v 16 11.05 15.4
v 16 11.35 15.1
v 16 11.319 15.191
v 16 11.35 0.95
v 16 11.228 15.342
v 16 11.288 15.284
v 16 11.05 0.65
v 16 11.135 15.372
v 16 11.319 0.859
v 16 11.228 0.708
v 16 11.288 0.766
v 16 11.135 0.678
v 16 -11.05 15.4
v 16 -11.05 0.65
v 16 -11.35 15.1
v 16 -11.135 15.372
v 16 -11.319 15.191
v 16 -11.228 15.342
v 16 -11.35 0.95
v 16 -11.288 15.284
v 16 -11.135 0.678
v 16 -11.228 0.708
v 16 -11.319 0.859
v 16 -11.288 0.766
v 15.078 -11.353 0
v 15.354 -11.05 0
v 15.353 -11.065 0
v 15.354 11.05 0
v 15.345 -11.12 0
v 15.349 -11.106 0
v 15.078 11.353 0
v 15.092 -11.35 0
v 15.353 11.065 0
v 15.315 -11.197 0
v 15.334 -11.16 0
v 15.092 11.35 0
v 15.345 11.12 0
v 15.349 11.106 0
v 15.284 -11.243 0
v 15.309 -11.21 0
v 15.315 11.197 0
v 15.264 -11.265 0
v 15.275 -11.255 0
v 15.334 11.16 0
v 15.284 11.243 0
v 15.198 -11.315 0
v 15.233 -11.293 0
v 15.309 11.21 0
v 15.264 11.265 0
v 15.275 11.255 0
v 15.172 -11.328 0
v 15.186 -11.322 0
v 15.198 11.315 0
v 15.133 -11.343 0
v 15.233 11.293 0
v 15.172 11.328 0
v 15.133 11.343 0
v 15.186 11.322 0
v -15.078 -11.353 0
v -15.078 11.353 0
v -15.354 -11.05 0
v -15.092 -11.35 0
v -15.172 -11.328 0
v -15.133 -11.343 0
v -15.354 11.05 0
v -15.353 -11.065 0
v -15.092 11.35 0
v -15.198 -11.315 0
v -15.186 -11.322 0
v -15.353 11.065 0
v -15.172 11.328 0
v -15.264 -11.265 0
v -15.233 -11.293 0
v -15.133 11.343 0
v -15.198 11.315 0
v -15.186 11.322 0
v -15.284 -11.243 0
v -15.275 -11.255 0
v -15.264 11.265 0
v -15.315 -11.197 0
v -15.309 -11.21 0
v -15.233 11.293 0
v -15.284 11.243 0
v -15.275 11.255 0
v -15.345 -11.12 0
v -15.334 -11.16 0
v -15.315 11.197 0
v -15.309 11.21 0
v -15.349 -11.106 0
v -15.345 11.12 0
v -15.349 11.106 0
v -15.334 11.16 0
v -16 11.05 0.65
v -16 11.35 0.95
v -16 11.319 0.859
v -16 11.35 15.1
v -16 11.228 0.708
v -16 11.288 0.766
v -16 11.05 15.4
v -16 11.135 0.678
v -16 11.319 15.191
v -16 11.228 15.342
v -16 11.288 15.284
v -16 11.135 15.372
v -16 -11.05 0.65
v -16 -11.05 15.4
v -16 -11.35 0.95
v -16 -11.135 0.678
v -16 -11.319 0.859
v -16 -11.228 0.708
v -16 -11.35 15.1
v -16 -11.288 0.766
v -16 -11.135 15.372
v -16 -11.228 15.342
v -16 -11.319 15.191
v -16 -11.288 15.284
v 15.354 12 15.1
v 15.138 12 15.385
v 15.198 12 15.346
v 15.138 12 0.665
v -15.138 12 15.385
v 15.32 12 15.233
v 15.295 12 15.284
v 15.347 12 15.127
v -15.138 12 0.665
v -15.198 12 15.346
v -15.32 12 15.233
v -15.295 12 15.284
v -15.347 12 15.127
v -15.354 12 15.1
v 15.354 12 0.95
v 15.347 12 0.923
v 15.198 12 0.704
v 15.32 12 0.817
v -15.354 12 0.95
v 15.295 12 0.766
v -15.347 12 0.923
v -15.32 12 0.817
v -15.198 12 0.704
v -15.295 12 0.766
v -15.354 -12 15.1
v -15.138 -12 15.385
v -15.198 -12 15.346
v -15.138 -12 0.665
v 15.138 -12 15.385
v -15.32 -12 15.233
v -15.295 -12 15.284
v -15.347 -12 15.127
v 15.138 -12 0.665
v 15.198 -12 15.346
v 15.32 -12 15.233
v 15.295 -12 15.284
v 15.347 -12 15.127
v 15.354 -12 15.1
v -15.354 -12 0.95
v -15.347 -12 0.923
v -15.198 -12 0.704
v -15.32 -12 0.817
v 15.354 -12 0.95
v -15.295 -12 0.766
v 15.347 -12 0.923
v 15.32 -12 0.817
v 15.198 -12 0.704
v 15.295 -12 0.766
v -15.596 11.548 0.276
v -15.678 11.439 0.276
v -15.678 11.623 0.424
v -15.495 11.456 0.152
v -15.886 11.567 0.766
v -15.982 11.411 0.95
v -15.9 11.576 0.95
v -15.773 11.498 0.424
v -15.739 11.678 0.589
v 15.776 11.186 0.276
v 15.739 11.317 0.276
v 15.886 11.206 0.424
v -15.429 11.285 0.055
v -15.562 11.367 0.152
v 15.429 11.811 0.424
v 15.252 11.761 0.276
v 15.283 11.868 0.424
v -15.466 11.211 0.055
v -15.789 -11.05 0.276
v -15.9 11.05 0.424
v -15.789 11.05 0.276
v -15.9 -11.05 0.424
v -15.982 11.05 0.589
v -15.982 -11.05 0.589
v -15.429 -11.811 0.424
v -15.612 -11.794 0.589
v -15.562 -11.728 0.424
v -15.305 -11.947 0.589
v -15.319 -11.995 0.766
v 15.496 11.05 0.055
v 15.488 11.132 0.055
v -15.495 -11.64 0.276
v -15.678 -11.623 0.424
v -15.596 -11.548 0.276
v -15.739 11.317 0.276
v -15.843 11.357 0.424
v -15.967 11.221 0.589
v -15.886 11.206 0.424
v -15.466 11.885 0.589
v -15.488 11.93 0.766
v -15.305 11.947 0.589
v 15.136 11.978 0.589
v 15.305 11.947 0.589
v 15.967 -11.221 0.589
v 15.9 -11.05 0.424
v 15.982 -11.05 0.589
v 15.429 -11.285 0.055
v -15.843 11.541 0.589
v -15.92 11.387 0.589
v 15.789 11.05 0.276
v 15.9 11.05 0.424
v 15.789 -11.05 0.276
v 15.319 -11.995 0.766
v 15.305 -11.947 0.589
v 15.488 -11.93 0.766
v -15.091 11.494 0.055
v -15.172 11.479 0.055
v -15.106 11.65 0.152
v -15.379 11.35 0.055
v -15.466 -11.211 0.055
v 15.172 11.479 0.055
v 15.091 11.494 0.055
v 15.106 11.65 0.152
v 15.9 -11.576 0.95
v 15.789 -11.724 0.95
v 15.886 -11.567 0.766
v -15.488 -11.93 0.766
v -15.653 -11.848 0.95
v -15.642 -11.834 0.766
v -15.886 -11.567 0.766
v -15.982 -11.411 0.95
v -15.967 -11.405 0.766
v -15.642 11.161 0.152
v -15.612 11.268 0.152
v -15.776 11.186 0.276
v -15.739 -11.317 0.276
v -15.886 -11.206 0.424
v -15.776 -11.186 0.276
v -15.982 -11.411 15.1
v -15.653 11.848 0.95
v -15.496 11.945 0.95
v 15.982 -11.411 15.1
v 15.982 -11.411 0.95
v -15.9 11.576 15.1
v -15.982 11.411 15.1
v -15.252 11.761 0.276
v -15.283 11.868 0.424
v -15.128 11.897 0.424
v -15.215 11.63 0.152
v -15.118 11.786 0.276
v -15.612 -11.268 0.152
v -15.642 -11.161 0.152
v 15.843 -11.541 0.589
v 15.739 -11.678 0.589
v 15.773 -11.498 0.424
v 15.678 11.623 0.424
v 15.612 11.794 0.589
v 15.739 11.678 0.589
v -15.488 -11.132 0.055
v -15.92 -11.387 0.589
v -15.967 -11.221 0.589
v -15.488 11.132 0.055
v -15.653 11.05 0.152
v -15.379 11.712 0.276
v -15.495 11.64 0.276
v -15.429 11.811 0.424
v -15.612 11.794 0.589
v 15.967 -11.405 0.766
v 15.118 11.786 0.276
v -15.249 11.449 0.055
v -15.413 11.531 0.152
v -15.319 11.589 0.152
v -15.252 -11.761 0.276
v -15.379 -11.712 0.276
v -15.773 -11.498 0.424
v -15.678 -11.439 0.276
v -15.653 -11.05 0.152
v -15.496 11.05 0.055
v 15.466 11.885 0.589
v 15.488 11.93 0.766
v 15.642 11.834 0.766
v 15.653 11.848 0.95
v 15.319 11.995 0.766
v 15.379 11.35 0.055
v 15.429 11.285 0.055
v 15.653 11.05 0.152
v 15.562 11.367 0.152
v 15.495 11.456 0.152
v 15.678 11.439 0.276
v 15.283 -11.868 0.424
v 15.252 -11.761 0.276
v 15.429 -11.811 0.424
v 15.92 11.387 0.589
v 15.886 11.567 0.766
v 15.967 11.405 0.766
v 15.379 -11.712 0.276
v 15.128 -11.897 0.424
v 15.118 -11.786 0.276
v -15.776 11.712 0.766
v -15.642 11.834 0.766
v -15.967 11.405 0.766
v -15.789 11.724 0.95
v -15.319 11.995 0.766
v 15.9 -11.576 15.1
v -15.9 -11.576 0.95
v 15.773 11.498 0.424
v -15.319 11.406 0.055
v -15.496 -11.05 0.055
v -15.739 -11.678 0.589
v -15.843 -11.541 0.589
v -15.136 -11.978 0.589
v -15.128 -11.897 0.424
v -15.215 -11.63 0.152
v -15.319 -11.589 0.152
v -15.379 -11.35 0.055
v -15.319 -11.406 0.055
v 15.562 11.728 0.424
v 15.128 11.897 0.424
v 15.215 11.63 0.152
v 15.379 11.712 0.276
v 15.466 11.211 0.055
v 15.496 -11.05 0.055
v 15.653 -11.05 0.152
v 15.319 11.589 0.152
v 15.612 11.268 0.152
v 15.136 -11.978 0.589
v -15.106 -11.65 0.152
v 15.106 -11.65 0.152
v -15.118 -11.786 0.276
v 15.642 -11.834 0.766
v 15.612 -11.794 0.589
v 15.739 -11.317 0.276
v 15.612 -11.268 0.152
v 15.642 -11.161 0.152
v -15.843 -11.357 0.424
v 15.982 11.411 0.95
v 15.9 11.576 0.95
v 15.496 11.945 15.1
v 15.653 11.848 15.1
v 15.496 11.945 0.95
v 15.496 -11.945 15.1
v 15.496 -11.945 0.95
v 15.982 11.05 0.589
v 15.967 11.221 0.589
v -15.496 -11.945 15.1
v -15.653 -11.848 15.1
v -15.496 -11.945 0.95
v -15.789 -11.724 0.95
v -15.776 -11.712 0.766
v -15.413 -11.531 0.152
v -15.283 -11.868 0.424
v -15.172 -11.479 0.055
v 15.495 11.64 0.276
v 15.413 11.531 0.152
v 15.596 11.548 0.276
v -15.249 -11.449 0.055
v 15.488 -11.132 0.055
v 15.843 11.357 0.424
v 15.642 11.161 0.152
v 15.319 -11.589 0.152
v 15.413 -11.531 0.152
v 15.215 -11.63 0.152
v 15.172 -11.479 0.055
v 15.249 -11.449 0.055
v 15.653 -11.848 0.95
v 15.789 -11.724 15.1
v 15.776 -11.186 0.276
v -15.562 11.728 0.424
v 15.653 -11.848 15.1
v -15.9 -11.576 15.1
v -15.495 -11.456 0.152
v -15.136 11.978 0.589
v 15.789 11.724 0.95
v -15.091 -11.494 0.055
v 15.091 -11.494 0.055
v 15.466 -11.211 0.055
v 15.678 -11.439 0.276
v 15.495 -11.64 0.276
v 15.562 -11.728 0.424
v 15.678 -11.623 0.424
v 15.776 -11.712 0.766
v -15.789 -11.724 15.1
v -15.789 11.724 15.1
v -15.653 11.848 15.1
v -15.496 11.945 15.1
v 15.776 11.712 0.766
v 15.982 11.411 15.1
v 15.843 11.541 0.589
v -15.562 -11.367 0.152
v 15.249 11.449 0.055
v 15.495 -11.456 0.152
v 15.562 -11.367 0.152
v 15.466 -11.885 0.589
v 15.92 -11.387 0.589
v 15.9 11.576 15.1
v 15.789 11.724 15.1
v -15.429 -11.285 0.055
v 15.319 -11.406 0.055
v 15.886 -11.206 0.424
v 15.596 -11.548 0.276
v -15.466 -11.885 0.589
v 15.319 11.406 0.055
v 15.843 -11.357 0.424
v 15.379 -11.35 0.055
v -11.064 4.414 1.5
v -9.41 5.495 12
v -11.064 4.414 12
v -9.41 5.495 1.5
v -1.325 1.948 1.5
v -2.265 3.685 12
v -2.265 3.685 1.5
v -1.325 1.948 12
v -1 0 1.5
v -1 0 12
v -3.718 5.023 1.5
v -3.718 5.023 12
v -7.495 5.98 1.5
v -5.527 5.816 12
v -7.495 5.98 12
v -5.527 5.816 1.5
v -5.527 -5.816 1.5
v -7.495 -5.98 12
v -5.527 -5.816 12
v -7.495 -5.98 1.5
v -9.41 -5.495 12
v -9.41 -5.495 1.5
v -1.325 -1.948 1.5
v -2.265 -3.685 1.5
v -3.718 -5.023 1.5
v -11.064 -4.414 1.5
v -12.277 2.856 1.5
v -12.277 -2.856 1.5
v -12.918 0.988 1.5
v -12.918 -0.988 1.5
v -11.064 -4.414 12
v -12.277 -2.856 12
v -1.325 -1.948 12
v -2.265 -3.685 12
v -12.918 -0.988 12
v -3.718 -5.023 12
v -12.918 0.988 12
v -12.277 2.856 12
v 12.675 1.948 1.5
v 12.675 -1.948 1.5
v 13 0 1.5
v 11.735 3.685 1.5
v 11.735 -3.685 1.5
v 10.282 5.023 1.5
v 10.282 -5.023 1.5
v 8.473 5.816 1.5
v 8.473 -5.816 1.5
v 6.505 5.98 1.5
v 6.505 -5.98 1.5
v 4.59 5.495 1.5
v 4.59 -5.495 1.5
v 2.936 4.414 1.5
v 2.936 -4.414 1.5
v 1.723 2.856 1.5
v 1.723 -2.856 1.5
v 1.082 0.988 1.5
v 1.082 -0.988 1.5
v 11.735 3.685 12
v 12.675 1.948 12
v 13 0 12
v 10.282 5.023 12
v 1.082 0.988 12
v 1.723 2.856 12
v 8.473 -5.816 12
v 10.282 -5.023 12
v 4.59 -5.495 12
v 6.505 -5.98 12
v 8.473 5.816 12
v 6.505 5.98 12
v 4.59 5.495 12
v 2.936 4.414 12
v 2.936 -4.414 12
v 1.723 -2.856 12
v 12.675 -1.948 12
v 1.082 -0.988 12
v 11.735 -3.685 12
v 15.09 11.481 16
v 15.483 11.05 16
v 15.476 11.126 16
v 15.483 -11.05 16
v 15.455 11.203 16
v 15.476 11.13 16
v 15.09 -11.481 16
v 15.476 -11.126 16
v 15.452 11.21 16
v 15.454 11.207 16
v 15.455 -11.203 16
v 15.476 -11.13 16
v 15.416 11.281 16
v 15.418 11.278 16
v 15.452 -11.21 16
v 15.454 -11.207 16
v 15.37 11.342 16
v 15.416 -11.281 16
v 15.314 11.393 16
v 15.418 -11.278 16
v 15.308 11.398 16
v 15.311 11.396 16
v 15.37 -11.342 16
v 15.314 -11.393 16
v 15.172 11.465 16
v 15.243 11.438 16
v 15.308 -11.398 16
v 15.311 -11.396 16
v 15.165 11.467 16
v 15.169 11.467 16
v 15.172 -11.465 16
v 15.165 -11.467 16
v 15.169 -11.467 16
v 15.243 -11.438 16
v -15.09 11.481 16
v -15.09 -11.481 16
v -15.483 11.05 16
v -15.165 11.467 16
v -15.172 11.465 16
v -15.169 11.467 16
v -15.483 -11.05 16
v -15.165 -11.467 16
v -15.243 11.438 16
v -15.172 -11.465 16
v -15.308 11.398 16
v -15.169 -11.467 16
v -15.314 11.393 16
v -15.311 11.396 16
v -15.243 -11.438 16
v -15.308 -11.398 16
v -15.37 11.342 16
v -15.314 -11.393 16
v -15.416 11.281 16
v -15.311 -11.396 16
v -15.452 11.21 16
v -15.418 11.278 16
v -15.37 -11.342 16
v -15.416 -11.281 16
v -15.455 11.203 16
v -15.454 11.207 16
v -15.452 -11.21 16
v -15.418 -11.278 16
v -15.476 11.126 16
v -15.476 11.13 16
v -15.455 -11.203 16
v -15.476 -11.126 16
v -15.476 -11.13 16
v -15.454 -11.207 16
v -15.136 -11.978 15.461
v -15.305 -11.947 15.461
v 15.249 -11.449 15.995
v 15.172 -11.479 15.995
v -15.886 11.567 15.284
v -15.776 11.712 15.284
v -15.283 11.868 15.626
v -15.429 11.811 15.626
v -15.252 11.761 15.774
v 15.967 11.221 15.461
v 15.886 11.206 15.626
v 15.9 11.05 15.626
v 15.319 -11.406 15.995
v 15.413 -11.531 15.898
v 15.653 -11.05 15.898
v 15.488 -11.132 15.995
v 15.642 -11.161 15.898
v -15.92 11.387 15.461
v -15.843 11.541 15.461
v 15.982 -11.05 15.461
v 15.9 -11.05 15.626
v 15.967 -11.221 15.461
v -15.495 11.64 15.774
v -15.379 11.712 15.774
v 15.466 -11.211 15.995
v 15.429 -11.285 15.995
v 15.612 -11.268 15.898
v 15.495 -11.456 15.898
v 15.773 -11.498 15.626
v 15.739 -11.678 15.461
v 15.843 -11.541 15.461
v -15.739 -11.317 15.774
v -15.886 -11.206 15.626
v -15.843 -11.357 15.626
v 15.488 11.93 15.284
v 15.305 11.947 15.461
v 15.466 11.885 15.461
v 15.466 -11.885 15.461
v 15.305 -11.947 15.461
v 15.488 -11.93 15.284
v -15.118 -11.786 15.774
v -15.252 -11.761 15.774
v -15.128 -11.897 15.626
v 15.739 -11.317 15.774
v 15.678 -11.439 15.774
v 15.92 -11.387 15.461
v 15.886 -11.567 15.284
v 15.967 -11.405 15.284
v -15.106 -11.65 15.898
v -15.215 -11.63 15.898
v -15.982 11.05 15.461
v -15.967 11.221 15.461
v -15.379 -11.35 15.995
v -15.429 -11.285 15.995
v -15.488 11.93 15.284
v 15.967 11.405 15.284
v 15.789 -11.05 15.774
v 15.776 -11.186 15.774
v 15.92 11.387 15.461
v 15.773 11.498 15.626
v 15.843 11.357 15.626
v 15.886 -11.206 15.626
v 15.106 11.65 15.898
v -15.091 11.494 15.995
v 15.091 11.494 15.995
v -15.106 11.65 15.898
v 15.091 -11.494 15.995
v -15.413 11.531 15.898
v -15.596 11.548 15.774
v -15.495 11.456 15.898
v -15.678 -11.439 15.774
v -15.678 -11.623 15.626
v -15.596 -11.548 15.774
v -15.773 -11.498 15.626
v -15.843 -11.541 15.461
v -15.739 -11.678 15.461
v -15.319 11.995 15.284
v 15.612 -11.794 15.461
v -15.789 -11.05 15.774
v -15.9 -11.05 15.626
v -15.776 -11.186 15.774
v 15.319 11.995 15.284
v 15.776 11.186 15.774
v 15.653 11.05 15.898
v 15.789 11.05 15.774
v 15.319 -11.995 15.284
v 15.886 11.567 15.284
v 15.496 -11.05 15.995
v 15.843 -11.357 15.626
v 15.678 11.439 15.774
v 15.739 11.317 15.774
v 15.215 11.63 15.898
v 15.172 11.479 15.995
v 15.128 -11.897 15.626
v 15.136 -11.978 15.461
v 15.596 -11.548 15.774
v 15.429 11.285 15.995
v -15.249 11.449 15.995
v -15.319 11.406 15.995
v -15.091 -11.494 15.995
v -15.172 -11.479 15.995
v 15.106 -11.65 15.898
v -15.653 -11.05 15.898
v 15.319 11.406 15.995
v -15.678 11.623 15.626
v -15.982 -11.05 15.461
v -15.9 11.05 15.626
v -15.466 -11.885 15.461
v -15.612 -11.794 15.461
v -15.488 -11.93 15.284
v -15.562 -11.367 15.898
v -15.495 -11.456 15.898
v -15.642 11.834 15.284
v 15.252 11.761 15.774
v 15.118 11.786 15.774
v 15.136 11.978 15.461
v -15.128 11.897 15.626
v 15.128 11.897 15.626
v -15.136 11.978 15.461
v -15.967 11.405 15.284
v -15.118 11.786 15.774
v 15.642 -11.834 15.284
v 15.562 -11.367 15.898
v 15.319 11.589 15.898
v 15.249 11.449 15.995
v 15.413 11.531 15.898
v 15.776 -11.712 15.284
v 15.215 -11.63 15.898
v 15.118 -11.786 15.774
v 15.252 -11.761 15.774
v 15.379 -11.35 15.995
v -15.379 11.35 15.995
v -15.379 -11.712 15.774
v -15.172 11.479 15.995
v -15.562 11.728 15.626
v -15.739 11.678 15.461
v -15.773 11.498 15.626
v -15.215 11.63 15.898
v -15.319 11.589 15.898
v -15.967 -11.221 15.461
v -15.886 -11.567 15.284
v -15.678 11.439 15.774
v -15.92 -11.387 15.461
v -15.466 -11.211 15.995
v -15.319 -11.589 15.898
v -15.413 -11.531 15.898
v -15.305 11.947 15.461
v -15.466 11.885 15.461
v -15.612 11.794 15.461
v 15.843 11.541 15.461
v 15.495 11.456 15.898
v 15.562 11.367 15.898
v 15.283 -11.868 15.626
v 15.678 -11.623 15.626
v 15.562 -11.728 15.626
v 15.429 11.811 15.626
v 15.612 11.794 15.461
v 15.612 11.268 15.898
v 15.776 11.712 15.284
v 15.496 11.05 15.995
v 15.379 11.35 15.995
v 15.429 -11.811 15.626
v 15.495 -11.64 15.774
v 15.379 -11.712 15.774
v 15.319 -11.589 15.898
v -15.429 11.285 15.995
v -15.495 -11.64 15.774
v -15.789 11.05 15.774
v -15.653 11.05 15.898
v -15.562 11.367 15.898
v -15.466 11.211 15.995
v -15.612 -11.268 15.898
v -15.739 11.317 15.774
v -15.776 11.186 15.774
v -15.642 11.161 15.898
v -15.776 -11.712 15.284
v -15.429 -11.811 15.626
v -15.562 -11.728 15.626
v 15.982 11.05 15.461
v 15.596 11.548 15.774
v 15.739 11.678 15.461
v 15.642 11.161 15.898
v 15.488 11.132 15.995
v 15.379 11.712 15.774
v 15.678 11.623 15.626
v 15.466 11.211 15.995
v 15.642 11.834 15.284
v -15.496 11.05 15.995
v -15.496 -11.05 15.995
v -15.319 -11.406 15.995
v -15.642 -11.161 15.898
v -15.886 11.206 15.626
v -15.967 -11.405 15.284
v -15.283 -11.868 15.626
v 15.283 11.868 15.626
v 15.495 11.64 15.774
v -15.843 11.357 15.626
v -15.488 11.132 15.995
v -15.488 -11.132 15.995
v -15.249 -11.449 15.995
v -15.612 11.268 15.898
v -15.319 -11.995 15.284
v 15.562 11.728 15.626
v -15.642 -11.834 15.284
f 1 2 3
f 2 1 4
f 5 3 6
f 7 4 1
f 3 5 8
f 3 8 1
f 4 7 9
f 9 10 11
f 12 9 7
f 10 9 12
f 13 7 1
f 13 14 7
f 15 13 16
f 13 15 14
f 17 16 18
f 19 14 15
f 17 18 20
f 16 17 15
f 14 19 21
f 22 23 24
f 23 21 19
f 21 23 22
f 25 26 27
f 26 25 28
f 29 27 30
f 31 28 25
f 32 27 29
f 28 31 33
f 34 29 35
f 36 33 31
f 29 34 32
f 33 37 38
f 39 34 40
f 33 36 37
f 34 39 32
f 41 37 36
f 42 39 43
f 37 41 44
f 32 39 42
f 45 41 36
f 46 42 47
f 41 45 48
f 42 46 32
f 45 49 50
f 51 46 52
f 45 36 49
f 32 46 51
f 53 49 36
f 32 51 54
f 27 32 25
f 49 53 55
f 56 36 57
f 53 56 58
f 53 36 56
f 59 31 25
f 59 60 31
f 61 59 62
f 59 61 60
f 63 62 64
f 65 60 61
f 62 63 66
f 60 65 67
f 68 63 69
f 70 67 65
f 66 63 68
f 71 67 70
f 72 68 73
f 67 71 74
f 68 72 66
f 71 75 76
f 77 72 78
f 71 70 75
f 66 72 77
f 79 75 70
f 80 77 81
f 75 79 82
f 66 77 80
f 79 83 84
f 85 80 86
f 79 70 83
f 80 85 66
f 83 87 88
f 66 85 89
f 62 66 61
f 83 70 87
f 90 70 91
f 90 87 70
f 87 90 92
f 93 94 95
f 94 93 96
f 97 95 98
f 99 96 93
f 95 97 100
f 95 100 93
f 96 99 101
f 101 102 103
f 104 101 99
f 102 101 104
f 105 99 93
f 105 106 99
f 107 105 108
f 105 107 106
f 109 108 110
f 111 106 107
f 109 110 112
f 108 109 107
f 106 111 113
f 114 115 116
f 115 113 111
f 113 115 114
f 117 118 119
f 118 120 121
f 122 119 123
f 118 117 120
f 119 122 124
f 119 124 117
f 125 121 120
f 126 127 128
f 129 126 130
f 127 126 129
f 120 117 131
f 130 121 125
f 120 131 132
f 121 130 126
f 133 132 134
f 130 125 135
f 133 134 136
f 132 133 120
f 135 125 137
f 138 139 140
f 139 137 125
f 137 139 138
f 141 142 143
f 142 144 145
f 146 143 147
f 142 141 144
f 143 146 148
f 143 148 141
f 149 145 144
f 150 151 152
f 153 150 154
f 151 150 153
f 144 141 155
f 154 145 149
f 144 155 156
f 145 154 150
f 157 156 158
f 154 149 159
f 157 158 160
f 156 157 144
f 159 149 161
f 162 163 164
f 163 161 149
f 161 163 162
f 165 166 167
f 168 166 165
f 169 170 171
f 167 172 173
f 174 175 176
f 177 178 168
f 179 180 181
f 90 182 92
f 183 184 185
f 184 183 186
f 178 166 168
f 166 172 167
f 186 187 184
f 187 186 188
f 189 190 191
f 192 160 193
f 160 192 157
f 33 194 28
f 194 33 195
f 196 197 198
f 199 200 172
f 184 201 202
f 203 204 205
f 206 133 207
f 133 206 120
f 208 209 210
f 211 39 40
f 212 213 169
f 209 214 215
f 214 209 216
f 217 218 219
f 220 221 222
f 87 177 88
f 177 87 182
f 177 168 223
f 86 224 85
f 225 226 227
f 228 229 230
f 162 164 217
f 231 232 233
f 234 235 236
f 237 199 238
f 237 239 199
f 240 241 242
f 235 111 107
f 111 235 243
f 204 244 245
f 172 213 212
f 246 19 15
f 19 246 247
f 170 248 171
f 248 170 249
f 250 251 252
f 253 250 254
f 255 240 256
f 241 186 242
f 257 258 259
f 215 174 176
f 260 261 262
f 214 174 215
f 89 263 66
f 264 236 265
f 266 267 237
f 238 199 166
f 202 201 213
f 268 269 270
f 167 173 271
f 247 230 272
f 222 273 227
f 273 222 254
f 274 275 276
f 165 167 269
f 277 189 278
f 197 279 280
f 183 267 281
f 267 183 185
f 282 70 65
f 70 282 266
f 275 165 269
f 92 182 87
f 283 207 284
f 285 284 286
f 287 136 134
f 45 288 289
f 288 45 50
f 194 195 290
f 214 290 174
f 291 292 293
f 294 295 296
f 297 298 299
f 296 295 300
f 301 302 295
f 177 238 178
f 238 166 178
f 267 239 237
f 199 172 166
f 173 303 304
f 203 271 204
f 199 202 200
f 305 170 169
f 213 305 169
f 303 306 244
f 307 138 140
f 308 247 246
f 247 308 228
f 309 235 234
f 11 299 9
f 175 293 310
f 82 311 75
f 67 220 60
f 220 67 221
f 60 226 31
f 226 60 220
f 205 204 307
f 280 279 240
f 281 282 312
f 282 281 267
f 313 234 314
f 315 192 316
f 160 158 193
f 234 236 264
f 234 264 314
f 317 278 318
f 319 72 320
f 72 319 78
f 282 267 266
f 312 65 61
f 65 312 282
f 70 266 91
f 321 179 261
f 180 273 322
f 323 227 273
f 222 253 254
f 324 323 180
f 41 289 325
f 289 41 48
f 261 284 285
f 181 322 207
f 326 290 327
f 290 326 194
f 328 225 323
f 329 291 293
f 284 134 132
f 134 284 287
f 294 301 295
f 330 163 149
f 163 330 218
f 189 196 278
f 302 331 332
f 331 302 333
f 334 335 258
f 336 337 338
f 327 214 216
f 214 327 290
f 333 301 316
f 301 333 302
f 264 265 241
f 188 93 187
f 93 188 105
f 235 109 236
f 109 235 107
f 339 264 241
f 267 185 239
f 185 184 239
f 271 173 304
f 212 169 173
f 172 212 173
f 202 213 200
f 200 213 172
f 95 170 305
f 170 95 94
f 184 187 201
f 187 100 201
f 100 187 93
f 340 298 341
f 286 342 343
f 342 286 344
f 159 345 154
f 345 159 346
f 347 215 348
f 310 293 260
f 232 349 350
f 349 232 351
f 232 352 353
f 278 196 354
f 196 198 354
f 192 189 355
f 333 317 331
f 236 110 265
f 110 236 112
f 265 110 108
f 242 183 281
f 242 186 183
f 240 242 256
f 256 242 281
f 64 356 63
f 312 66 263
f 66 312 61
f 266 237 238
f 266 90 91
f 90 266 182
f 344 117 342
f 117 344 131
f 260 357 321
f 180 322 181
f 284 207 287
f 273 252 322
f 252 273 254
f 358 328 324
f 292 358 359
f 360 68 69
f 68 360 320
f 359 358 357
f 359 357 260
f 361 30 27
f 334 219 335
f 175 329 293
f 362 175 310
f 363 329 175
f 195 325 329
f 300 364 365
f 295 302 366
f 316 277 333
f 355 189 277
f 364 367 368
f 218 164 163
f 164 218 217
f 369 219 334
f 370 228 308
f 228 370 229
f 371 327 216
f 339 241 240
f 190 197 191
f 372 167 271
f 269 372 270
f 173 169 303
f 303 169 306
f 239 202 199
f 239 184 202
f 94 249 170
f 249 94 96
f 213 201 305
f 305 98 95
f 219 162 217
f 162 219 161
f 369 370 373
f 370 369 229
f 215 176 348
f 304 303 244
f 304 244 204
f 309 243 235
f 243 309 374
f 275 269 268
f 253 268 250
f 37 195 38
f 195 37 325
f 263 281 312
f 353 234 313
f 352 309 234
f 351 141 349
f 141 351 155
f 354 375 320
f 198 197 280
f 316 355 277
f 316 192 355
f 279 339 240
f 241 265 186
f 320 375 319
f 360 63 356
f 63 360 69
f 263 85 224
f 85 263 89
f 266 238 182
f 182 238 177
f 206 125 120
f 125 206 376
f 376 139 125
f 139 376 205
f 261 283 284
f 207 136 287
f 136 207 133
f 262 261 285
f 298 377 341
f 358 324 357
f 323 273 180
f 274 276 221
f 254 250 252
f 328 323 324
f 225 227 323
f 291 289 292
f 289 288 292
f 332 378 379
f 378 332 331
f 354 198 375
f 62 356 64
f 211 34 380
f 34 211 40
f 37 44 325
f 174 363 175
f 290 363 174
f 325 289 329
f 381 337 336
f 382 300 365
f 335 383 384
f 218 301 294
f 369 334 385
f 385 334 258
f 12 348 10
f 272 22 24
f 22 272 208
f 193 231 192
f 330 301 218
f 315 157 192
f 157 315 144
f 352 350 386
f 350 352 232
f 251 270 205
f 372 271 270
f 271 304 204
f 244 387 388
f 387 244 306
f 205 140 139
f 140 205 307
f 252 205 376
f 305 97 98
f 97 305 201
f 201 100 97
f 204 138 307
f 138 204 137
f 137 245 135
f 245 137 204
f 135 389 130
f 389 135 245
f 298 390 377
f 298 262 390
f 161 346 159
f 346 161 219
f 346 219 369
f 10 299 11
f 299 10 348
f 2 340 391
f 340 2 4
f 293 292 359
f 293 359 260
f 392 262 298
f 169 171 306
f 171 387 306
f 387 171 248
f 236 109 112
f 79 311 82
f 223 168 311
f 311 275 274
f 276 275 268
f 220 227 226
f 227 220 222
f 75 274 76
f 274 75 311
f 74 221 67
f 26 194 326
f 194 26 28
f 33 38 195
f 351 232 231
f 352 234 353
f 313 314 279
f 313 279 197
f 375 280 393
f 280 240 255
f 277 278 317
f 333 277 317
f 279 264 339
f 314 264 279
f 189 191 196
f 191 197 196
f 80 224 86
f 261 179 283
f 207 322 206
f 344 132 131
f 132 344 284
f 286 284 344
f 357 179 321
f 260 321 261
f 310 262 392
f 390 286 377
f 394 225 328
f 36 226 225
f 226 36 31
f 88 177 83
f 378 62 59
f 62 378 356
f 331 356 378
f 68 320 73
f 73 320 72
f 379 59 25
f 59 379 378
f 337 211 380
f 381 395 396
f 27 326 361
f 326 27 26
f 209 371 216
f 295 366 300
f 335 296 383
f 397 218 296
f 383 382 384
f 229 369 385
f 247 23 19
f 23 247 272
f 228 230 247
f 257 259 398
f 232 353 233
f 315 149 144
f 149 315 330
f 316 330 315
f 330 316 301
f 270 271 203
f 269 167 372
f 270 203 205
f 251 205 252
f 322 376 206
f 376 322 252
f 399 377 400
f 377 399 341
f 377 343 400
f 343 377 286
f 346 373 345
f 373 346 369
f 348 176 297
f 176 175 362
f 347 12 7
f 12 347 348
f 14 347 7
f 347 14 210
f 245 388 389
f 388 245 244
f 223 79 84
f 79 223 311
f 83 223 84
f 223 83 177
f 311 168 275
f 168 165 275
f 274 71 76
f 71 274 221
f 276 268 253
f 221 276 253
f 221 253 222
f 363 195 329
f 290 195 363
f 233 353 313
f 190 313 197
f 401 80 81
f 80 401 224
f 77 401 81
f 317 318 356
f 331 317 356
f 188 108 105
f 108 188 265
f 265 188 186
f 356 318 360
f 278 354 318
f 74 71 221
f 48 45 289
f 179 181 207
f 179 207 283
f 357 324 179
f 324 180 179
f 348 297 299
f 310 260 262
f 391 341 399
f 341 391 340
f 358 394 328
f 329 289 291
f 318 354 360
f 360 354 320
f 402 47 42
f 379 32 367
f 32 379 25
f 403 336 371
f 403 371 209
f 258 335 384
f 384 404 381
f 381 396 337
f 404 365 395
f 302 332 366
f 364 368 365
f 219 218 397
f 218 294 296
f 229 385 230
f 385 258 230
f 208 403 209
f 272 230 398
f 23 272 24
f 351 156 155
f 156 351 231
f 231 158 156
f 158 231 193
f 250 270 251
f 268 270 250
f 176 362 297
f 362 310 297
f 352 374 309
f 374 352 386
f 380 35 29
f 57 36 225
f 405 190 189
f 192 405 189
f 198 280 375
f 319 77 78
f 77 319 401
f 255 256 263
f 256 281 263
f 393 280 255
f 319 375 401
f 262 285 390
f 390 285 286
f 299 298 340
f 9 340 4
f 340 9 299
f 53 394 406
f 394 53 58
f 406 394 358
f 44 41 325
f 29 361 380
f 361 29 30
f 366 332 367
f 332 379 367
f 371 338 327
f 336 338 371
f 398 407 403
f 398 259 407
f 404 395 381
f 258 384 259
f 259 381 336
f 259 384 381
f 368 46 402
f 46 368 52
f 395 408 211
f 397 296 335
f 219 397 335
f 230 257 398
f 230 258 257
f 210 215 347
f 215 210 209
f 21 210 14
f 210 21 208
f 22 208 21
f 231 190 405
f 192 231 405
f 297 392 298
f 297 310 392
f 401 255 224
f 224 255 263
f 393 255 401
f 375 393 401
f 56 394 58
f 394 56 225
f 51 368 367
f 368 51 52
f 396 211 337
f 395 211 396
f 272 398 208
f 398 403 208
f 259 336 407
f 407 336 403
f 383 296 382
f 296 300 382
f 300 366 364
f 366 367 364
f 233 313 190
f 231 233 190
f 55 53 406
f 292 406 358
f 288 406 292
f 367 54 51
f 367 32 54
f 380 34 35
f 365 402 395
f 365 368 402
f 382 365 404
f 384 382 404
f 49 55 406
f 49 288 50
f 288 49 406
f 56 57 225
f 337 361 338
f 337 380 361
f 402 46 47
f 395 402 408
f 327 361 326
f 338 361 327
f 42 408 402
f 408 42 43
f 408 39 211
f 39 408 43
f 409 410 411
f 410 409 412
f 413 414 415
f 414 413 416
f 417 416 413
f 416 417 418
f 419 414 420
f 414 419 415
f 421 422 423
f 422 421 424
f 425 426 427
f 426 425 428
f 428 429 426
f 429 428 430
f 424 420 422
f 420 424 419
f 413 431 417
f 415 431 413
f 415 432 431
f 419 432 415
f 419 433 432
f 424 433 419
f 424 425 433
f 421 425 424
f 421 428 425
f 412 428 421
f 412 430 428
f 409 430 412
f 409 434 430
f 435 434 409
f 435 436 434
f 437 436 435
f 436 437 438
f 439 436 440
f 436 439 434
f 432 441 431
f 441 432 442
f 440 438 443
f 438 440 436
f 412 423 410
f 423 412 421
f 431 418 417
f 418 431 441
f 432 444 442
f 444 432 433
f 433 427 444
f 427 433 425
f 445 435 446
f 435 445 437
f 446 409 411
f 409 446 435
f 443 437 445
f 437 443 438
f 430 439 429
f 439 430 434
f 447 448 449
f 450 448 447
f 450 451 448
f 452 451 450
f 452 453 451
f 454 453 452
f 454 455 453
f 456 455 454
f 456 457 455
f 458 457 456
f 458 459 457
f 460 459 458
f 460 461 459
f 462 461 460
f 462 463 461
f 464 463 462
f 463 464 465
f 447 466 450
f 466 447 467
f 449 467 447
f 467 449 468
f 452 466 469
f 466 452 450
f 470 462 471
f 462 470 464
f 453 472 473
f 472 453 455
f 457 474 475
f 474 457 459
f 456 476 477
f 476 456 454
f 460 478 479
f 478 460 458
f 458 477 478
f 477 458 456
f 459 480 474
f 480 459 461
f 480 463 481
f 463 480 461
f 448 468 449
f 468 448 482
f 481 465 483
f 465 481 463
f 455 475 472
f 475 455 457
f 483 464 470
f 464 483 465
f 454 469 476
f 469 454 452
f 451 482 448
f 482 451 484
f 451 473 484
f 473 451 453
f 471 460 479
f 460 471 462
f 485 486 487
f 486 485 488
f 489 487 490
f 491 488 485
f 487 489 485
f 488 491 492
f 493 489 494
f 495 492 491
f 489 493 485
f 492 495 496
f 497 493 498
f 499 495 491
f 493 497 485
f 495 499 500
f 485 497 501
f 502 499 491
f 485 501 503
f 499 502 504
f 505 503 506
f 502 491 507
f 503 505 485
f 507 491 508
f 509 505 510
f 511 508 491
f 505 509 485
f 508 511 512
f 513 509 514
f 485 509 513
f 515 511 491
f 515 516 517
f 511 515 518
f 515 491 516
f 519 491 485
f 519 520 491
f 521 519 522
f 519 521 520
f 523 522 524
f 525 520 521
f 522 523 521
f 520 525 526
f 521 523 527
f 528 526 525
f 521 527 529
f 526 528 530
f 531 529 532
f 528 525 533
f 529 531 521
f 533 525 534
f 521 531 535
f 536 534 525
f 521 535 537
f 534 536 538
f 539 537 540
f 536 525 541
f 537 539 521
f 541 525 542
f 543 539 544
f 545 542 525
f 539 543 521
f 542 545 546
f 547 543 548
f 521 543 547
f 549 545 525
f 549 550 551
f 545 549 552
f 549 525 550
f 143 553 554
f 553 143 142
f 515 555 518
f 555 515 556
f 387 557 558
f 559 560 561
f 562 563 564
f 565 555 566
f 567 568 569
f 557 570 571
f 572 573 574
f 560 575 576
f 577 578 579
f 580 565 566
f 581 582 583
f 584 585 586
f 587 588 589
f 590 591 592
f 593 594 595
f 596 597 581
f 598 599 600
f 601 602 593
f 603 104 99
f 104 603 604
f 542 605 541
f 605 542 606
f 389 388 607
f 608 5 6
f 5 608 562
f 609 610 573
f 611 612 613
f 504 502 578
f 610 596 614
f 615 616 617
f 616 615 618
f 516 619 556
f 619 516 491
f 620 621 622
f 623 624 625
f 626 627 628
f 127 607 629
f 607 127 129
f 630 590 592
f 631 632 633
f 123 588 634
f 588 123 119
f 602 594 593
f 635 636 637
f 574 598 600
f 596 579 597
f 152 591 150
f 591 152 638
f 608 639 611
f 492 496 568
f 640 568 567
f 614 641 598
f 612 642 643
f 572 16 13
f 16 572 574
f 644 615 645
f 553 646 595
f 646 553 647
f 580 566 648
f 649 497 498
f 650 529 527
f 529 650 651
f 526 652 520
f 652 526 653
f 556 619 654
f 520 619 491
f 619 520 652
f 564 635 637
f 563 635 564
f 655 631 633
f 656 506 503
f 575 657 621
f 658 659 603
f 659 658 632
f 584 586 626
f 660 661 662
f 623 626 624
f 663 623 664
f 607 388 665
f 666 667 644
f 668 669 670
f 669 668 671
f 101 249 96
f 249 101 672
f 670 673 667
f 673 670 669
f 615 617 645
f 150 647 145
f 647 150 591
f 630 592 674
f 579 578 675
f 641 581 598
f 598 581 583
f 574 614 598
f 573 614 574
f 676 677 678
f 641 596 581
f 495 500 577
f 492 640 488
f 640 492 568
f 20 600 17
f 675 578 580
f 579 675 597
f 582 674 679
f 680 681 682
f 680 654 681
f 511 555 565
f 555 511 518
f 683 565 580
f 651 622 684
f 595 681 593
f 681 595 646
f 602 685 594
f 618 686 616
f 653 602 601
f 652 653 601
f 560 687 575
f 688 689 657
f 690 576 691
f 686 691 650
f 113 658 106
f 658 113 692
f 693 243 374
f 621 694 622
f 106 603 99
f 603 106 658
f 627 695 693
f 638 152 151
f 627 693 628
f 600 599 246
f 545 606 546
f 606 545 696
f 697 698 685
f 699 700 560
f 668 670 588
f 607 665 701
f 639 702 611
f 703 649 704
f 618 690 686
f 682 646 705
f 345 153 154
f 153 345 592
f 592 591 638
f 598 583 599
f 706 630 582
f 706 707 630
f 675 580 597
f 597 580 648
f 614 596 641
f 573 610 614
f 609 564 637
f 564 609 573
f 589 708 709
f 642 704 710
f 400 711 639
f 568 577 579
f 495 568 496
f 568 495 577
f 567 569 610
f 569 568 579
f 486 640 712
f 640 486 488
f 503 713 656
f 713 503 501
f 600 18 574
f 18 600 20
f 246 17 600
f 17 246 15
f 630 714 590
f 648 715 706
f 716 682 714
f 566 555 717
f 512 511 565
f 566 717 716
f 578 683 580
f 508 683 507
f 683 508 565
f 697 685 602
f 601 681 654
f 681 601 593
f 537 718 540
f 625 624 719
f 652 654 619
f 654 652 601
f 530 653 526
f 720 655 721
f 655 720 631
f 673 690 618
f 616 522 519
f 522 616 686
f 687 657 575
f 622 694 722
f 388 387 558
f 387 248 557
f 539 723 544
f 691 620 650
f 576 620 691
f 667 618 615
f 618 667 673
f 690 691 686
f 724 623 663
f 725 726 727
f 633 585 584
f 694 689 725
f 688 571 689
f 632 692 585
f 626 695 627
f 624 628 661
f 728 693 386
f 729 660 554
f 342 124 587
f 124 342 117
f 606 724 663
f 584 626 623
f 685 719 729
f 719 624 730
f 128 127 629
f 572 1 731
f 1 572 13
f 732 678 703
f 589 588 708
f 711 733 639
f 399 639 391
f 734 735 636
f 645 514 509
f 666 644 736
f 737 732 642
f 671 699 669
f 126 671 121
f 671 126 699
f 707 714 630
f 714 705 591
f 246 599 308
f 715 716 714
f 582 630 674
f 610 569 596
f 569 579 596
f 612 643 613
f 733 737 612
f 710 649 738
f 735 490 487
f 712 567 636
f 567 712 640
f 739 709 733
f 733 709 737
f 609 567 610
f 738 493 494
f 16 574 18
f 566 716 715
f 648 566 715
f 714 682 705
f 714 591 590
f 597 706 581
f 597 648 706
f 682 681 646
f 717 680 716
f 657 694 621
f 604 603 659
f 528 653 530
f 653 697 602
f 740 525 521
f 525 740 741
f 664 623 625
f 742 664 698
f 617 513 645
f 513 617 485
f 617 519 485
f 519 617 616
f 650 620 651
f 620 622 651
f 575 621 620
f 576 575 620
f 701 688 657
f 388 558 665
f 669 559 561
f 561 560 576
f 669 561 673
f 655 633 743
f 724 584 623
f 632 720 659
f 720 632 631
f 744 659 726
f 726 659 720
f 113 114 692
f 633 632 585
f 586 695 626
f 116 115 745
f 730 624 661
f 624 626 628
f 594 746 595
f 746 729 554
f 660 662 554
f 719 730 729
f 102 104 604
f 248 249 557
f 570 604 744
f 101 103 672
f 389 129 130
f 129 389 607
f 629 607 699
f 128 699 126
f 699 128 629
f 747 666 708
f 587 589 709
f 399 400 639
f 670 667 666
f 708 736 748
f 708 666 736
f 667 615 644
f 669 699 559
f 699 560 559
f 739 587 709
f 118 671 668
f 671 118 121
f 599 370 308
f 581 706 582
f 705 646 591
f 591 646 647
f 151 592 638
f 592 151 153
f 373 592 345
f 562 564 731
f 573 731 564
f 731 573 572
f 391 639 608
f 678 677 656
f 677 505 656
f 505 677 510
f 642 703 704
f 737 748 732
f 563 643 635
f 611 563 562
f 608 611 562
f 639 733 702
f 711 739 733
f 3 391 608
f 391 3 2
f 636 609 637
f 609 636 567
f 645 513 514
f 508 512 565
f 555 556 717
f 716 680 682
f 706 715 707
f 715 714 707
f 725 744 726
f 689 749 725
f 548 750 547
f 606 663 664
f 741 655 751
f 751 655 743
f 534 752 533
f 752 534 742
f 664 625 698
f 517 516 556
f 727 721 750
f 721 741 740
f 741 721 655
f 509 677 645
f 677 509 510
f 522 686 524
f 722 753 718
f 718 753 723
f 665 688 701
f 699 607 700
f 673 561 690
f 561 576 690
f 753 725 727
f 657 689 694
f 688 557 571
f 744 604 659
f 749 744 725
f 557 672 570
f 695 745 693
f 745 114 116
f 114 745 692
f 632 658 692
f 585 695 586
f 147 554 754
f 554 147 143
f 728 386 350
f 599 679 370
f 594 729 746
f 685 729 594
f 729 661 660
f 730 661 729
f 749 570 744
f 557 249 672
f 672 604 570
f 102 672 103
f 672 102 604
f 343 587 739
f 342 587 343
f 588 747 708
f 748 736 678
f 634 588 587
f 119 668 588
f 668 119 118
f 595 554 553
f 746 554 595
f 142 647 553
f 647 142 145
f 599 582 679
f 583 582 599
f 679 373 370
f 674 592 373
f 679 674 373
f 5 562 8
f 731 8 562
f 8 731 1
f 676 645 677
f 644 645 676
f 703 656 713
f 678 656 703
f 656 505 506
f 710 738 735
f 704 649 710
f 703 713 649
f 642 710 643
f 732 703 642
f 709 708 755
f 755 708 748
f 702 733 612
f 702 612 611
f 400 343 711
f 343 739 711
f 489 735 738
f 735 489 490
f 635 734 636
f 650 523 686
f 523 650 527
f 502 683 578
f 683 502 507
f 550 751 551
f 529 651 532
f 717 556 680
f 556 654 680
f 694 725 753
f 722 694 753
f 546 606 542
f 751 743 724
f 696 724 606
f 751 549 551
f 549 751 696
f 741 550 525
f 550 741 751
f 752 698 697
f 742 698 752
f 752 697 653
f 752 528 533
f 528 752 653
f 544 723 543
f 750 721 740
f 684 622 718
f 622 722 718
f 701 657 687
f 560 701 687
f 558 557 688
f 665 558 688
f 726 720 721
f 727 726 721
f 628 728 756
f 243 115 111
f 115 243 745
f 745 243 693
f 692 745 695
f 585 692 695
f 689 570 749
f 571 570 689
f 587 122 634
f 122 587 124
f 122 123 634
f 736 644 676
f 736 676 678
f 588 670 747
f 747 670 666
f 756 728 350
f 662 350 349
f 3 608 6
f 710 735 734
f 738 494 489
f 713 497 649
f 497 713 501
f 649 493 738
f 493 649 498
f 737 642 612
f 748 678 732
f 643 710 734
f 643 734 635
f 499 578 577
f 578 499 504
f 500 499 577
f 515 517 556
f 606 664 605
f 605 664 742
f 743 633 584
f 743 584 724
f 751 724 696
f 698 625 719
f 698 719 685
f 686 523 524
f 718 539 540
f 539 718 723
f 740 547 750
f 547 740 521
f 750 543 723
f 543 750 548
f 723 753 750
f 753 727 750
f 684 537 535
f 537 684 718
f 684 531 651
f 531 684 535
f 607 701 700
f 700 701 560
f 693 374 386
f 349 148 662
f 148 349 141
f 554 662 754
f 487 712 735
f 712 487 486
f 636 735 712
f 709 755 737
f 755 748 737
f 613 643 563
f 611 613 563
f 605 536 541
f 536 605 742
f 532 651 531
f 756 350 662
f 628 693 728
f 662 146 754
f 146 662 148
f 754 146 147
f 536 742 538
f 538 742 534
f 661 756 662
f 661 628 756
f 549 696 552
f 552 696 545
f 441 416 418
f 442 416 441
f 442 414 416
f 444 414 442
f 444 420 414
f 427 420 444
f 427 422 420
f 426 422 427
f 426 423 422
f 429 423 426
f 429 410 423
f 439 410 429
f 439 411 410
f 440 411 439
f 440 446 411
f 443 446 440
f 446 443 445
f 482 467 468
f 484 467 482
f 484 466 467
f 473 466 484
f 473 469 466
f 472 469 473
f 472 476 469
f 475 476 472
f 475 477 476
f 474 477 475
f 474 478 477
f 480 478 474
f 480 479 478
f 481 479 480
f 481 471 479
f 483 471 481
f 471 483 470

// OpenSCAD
color("black")
intersection(){
    translate([0,0,16.1])
      rotate([180,0,90])
      resize([24,32,3])
      surface(file = "testtile.png", center = true, invert = false);
    translate([0,0,13])
      cube([32,24,3],center=true);
};

color("green")
difference(){
    intersection(){
        translate([0,0,1.5])
          cube([32,24,3],center=true);
        hull(){
            $fn = 34;
            translate([-15.05,-11.05,.95]) sphere(r=1);
            translate([-15.05,11.05,.95]) sphere(r=1);
            translate([15.05,-11.05,.95]) sphere(r=1);
            translate([15.05,11.05,.95]) sphere(r=1);

            translate([-15.05,-11.05,15.1]) sphere(r=1);
            translate([-15.05,11.05,15.1]) sphere(r=1);
            translate([15.05,-11.05,15.1]) sphere(r=1);
            translate([15.05,11.05,15.1]) sphere(r=1);
        };
    };
   translate([-7,0,1.5])
     cylinder(h=9,r=6);
   translate([7,0,1.5])
     cylinder(h=9,r=6);
};



#color("white")
difference(){
    intersection(){
        union(){
            translate([0,0,9.5])
              cube([32,24,13],center=true);
        };
        hull(){
            $fn = 34;
            translate([-15.05,-11.05,.95]) sphere(r=1);
            translate([-15.05,11.05,.95]) sphere(r=1);
            translate([15.05,-11.05,.95]) sphere(r=1);
            translate([15.05,11.05,.95]) sphere(r=1);

            translate([-15.05,-11.05,15.1]) sphere(r=1);
            translate([-15.05,11.05,15.1]) sphere(r=1);
            translate([15.05,-11.05,15.1]) sphere(r=1);
            translate([15.05,11.05,15.1]) sphere(r=1);
        };
    };

    translate([0,0,16.1])
      rotate([180,0,90])
      resize([24,32,3])
      surface(file = "testtile.png", center = true, invert = false);
  #  translate([-7,0,3])
      cylinder(h=9,r=6);
  #  translate([7,0,3])
      cylinder(h=9,r=6);
};
